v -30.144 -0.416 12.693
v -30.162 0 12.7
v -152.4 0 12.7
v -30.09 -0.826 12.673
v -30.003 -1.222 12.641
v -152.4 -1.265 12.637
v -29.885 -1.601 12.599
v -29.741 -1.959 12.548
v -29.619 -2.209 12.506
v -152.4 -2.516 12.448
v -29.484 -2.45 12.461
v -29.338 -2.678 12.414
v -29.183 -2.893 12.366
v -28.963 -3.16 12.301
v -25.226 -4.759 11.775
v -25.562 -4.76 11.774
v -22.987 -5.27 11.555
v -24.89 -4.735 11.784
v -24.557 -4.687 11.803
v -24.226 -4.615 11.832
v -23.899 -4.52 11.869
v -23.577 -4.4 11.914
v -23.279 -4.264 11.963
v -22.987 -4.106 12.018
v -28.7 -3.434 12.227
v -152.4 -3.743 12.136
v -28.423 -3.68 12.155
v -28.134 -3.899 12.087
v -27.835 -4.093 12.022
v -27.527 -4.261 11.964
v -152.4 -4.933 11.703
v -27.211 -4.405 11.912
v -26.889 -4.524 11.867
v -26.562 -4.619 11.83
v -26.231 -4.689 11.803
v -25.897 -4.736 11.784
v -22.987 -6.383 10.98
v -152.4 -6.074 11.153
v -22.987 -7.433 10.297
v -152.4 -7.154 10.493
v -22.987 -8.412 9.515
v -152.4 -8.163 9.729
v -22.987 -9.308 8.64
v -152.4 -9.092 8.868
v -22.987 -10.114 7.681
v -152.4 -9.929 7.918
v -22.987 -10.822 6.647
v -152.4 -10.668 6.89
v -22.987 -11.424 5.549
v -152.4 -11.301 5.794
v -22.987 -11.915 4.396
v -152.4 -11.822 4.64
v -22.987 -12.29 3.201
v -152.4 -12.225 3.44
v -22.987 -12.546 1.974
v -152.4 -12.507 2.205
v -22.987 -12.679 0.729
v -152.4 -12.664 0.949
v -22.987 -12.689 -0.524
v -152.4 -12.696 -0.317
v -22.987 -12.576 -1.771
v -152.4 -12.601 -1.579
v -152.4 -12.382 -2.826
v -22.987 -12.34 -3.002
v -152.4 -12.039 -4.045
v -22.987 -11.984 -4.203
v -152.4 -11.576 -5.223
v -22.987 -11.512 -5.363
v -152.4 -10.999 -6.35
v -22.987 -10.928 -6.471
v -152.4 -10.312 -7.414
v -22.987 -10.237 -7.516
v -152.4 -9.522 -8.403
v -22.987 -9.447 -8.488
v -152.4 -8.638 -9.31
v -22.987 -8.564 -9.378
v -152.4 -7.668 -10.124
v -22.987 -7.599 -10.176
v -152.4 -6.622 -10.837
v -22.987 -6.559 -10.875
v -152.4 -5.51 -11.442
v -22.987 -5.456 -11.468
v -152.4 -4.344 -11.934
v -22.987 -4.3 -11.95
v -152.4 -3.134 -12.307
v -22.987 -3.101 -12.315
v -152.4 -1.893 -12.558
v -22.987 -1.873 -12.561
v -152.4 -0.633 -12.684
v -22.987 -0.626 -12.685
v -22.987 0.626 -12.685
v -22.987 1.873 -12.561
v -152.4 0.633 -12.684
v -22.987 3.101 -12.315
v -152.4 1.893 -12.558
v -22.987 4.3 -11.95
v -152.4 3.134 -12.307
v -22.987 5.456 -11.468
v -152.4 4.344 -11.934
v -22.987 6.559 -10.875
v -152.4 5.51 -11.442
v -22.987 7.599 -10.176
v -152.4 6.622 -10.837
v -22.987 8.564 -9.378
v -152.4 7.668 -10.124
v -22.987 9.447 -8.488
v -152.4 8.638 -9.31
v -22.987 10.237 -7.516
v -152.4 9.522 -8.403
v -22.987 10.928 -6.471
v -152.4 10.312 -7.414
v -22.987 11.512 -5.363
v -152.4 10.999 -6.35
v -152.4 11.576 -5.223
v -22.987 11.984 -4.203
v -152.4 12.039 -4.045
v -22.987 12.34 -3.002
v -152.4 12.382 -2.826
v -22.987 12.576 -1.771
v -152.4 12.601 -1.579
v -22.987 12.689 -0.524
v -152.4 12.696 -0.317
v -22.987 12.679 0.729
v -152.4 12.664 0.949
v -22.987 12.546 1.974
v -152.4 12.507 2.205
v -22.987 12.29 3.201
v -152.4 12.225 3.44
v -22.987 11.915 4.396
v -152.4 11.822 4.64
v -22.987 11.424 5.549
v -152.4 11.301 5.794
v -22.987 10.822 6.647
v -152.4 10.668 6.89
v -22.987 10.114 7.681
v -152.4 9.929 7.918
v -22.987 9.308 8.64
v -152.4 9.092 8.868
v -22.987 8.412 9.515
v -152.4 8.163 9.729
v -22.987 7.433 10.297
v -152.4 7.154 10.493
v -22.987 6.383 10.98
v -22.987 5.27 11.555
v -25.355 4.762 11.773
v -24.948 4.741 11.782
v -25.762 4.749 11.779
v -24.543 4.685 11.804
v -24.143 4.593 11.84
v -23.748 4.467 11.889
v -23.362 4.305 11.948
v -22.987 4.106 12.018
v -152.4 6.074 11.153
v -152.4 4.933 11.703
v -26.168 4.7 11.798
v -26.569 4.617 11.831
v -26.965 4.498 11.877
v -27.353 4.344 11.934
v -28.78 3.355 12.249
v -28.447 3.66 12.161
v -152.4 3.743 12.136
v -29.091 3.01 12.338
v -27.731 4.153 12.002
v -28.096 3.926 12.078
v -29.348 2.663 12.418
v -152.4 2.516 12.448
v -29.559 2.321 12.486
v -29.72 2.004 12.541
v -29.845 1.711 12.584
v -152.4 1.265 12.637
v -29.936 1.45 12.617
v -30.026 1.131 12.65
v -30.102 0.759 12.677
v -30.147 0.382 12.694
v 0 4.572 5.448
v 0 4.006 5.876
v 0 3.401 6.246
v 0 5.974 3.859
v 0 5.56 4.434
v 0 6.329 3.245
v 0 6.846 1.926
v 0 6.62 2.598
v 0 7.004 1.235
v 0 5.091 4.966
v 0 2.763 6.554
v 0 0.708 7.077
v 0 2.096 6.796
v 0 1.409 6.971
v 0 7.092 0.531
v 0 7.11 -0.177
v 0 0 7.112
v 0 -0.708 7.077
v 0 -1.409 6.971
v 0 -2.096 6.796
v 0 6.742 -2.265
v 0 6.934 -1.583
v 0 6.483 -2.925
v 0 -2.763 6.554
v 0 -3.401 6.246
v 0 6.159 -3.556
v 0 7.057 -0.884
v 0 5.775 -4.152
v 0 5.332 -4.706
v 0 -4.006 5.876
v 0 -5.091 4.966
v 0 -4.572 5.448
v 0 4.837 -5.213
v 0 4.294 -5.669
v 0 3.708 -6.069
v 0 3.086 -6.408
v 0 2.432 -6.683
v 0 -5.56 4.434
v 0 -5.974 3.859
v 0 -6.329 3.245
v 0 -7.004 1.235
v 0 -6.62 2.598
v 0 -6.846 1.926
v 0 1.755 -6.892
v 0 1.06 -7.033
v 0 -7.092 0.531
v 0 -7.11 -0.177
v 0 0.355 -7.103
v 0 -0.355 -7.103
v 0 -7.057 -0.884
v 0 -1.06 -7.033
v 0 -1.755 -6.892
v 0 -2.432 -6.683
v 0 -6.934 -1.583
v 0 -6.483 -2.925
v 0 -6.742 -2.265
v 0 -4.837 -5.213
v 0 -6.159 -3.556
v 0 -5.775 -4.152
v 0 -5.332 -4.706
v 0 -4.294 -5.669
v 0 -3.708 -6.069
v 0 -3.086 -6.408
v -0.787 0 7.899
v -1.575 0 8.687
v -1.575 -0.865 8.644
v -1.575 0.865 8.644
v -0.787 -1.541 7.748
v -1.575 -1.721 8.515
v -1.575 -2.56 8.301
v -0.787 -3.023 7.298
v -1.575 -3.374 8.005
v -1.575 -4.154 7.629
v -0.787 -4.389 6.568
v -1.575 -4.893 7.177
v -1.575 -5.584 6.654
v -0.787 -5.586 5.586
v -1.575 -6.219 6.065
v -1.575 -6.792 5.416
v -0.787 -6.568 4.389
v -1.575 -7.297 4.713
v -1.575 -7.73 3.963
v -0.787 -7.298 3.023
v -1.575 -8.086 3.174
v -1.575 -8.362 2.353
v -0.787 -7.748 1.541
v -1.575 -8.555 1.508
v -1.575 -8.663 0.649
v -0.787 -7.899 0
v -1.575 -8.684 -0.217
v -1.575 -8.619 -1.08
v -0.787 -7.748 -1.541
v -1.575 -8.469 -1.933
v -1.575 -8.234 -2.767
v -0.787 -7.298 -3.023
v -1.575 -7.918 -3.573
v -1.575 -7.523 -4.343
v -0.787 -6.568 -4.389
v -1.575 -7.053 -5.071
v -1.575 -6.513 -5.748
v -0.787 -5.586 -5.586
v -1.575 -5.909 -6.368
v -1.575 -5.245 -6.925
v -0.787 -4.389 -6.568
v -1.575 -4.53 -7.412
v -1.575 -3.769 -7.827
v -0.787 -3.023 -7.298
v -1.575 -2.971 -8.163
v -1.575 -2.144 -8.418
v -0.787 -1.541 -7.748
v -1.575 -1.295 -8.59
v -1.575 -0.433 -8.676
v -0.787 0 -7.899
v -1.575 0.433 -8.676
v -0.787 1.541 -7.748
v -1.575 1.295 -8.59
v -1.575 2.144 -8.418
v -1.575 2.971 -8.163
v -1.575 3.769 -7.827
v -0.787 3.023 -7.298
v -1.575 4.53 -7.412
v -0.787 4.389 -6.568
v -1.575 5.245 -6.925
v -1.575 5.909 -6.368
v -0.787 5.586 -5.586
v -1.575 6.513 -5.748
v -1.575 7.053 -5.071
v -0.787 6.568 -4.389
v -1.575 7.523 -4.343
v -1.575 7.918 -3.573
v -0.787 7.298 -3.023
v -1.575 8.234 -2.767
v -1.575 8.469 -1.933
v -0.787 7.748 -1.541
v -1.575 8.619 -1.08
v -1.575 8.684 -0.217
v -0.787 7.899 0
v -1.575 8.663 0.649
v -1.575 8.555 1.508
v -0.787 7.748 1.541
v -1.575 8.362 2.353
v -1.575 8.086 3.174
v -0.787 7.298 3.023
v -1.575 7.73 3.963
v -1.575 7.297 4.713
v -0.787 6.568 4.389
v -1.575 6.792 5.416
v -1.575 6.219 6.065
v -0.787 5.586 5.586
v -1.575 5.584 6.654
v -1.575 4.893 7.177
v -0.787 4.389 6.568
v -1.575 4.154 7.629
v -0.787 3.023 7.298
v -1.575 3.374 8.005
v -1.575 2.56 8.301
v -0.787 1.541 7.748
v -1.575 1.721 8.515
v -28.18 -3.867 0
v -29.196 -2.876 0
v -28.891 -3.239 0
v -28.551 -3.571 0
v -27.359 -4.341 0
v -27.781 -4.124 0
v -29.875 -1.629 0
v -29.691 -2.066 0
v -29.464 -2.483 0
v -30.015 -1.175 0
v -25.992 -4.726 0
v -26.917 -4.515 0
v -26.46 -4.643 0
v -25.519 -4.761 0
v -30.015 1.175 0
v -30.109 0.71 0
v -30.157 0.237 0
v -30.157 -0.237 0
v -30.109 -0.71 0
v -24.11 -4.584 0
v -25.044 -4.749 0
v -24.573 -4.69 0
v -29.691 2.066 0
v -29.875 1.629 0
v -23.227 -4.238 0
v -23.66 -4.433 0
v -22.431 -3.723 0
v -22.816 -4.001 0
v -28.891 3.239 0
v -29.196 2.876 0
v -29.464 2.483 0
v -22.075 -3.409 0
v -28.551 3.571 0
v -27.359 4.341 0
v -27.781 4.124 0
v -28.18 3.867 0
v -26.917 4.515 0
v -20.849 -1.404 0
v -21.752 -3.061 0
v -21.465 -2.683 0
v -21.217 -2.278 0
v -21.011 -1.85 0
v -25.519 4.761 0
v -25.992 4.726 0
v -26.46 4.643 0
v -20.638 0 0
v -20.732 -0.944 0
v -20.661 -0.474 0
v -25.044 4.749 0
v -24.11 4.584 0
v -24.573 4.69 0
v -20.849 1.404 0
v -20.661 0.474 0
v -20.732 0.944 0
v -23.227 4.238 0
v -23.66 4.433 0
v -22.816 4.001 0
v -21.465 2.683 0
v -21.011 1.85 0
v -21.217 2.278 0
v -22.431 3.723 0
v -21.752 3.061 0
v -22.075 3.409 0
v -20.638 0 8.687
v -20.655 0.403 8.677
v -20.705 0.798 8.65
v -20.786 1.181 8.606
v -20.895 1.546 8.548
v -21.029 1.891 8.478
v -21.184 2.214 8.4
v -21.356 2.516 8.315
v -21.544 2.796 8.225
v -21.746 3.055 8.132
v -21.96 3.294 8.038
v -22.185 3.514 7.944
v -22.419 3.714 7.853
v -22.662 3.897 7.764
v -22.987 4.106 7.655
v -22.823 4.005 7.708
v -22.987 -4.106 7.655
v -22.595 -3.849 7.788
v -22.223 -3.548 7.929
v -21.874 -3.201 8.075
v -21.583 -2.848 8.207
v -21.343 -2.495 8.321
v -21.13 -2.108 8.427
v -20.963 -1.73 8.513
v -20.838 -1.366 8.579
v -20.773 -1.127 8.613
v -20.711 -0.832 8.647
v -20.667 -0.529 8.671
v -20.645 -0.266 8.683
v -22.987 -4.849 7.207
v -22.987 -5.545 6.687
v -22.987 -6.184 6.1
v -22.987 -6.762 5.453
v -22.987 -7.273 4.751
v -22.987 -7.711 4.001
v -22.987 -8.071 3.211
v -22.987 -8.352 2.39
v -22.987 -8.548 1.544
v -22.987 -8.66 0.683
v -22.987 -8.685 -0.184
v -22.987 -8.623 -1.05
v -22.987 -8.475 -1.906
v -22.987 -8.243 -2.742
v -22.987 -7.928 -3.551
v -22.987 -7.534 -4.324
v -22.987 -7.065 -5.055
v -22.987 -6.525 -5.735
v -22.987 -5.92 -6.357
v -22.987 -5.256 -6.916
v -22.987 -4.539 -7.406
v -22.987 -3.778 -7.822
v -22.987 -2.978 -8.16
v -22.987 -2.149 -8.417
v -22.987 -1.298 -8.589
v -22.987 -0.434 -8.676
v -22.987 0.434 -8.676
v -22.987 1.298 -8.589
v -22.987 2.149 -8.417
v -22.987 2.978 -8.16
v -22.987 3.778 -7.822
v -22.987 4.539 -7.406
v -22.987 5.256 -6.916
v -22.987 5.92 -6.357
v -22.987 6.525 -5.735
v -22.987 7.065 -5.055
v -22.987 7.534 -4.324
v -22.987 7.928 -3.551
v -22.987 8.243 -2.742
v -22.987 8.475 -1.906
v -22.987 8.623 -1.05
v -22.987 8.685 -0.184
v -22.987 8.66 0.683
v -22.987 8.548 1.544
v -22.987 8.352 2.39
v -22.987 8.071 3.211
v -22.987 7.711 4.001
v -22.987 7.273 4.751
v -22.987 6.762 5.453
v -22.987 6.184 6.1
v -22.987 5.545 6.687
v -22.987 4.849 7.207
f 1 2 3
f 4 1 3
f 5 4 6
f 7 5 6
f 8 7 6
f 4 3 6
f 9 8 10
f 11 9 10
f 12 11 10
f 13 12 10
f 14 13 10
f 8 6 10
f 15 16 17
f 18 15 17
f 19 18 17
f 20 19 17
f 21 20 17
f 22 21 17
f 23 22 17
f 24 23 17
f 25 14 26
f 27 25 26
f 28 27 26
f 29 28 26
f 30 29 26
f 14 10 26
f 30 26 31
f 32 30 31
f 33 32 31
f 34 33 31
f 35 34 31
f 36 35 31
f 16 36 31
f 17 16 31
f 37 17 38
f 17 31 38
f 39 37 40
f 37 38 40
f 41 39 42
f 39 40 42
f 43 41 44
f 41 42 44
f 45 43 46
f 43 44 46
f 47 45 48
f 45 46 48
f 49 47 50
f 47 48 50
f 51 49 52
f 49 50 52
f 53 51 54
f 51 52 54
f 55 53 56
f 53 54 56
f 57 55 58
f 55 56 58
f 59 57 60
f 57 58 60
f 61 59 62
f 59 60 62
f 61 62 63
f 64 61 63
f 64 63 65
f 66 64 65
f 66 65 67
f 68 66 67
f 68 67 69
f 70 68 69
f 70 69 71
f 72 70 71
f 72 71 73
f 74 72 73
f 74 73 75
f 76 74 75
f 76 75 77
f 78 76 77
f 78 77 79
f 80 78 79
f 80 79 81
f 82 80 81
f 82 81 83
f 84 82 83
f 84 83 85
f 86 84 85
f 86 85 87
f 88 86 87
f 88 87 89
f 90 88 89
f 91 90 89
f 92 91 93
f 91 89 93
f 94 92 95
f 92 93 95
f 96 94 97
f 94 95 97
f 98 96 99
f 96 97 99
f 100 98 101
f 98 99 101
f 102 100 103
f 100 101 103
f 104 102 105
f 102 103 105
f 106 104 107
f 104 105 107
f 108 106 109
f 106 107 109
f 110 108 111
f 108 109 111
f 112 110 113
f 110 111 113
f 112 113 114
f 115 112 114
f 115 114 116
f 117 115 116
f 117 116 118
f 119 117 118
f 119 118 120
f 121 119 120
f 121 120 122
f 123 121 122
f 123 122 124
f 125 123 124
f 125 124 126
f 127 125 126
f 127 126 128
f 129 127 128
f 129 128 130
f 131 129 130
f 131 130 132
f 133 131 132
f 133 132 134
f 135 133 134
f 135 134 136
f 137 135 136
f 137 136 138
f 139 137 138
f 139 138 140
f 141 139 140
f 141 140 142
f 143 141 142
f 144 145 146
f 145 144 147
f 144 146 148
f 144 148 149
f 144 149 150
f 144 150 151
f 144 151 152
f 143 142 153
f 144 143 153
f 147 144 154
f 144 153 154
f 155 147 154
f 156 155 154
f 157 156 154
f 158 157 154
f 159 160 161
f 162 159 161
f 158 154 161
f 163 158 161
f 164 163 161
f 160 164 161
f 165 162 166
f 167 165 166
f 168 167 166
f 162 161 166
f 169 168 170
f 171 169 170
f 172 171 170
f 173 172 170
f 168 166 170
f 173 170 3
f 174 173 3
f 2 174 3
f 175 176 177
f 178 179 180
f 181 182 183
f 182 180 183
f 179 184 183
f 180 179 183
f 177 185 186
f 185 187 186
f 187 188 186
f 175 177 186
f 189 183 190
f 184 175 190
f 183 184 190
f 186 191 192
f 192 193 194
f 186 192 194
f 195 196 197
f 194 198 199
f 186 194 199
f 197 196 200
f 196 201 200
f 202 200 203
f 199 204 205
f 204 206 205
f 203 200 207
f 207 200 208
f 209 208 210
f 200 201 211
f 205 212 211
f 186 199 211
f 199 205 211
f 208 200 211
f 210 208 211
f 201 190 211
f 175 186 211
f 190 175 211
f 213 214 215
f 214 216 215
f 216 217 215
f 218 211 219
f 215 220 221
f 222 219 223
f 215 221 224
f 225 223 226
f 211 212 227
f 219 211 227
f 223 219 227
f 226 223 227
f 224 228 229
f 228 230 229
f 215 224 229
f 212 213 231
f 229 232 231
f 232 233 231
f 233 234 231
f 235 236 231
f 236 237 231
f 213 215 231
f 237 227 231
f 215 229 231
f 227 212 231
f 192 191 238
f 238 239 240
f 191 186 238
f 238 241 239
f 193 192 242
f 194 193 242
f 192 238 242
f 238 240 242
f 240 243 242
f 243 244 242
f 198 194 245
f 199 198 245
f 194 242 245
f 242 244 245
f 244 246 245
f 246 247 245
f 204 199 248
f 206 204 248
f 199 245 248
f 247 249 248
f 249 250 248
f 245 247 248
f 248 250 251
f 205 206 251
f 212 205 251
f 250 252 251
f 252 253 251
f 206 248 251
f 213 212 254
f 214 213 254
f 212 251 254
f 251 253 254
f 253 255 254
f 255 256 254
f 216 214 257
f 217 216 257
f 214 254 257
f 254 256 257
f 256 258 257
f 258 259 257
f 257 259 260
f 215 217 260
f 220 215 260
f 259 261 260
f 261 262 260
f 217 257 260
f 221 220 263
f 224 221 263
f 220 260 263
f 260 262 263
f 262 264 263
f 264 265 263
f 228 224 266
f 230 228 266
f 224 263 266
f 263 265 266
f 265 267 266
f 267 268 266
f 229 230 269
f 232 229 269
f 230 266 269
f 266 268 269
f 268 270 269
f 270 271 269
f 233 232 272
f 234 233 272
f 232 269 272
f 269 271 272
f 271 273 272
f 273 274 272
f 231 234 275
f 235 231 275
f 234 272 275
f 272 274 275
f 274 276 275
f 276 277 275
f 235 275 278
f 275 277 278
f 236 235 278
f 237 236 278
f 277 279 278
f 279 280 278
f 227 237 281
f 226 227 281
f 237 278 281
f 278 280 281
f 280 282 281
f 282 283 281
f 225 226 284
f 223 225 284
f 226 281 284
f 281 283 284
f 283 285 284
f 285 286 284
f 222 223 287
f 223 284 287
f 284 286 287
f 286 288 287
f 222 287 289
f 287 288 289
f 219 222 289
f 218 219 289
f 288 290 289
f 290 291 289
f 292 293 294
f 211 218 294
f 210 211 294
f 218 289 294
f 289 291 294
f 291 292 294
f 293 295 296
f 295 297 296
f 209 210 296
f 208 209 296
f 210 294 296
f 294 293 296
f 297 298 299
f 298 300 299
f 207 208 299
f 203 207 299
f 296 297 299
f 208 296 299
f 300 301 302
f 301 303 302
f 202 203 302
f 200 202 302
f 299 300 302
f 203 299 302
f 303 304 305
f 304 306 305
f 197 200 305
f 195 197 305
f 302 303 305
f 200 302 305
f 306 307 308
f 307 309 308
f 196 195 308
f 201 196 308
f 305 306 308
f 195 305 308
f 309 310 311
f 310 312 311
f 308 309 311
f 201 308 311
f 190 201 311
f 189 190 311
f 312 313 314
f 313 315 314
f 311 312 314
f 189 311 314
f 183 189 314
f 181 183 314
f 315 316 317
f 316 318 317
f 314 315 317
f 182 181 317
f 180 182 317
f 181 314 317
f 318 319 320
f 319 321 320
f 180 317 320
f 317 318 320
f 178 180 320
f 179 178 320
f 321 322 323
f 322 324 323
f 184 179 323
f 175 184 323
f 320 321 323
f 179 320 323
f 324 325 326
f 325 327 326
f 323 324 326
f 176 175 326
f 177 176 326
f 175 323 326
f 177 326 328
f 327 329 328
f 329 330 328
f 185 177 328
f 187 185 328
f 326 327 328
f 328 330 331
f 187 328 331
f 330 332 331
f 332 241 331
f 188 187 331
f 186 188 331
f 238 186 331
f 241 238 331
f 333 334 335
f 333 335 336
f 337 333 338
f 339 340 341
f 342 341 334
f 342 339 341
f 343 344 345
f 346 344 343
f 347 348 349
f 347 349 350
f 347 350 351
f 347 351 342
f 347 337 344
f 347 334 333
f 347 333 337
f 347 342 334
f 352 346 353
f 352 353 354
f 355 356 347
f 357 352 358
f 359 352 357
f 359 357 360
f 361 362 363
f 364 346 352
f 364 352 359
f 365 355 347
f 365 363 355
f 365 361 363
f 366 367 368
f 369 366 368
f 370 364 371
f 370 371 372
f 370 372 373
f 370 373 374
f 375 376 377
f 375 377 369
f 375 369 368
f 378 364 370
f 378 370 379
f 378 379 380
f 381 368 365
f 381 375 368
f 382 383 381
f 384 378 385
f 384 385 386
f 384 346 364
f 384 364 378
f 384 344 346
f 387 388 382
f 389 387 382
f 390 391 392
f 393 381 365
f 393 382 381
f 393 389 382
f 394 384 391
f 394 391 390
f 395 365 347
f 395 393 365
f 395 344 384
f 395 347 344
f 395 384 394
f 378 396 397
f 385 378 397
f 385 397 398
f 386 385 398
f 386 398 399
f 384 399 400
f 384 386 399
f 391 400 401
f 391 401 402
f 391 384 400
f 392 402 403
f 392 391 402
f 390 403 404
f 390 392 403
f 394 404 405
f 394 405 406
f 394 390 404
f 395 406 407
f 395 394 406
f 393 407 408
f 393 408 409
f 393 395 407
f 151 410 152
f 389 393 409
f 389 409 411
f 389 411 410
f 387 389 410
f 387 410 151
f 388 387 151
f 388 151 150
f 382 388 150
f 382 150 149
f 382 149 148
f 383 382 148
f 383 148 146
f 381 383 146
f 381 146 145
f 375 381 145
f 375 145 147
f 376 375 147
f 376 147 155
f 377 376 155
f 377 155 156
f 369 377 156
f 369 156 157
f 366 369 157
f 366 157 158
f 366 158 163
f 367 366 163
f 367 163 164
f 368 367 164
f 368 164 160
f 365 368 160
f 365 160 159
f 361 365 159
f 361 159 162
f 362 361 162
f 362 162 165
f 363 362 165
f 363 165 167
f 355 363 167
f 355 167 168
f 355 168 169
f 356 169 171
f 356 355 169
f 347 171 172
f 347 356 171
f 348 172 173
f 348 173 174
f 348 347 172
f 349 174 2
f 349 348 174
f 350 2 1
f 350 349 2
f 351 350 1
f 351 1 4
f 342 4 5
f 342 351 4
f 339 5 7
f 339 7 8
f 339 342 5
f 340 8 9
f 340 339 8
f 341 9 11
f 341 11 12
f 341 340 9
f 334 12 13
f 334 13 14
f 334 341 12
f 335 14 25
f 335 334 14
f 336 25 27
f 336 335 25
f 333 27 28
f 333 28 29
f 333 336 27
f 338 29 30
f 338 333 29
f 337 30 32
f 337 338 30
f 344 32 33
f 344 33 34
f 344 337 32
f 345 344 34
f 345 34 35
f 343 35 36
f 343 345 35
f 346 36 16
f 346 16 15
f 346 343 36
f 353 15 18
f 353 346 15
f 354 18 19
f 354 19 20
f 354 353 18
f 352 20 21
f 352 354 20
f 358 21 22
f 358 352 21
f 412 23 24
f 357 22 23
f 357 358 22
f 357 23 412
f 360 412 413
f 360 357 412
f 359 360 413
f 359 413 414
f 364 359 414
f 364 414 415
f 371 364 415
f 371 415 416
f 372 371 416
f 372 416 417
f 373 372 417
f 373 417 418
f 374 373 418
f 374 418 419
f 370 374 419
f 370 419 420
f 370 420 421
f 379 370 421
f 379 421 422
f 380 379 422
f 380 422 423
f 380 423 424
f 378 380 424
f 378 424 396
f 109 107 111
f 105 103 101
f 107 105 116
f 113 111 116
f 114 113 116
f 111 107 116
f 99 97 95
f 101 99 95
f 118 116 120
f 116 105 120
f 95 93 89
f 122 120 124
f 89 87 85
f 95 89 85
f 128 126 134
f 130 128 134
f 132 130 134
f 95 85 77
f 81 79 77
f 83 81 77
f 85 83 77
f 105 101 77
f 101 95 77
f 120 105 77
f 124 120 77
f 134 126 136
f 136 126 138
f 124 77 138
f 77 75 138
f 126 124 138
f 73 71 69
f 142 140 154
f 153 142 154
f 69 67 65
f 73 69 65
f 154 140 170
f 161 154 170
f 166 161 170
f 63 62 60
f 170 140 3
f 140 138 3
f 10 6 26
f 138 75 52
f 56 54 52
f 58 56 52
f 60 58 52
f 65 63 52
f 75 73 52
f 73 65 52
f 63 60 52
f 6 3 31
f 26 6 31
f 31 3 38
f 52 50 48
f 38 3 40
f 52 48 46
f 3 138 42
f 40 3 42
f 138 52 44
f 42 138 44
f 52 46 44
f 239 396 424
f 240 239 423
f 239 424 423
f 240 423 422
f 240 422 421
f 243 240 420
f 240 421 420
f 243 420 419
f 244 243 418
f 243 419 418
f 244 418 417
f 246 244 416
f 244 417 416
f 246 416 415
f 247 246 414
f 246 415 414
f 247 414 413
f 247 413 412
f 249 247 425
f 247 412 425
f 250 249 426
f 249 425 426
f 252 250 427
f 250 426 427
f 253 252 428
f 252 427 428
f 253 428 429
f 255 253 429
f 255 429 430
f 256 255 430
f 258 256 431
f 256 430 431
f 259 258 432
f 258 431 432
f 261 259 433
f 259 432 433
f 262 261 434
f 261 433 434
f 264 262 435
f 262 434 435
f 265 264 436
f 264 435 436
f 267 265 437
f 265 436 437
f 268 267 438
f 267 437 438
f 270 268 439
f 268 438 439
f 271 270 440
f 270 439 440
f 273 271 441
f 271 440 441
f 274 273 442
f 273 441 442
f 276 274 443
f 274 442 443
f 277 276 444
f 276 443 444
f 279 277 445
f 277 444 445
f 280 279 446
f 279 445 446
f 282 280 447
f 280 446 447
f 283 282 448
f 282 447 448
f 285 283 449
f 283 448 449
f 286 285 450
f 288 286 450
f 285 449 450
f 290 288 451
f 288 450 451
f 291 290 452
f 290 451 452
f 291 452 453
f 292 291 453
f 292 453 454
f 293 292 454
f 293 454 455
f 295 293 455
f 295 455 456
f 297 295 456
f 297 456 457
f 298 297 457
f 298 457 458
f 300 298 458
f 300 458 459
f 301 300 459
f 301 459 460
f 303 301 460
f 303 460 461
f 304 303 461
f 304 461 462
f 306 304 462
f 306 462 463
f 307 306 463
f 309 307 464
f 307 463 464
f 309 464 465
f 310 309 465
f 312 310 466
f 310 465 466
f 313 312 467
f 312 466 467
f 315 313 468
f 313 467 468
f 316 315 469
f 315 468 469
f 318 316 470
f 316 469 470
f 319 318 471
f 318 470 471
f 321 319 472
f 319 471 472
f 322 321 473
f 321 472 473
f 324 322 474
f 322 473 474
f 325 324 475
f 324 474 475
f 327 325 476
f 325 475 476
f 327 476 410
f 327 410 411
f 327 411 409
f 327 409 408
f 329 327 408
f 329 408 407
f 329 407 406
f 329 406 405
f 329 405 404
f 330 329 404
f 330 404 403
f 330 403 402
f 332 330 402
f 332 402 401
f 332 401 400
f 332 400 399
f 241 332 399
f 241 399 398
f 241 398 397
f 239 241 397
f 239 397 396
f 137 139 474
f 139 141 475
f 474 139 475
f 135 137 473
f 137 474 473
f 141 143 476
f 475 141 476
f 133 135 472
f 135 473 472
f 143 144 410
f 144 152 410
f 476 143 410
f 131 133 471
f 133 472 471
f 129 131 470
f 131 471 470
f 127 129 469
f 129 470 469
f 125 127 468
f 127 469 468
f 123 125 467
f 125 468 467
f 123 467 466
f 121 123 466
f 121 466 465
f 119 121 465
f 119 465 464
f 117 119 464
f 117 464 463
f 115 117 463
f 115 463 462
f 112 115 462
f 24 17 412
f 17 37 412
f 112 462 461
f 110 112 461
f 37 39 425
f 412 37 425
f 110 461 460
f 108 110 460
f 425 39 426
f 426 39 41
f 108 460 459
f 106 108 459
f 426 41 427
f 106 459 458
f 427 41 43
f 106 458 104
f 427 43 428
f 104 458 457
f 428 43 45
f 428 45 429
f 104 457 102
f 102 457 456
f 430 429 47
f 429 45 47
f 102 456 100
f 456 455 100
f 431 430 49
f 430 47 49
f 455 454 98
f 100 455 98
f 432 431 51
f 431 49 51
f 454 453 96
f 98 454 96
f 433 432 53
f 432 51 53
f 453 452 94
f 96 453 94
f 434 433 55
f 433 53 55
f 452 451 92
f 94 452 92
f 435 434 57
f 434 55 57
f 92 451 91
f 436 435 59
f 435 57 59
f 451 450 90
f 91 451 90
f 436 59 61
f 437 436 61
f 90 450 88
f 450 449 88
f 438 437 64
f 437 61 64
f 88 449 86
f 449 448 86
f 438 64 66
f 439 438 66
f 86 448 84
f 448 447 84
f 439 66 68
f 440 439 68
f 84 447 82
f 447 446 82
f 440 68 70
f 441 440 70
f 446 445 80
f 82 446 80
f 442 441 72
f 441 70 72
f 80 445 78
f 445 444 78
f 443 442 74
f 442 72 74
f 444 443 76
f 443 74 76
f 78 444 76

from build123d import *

# Parameters (mm, degrees)
F2_R     = 4.7625
F3_DEPTH = 25.4


with BuildPart() as f1:
    # F0 (on Front) → F1 (revolve)
    with BuildSketch(Plane.XZ):
        Polygon((-152.4, 0), (0, 0), (0, 7.112), (-1.5748, 8.6868), (-22.987, 8.6868), (-22.987, 12.7), (-152.4, 12.7), align=None)
    revolve(axis=Axis((-76.2, 0, 0), (1, 0, 0)))

    # F2 (on Top) → F3 (cut)
    with BuildSketch(Plane.XY):
        with Locations((-25.4, 0)):
            Circle(F2_R)
    extrude(amount=F3_DEPTH, mode=Mode.SUBTRACT)


solid = f1.part
